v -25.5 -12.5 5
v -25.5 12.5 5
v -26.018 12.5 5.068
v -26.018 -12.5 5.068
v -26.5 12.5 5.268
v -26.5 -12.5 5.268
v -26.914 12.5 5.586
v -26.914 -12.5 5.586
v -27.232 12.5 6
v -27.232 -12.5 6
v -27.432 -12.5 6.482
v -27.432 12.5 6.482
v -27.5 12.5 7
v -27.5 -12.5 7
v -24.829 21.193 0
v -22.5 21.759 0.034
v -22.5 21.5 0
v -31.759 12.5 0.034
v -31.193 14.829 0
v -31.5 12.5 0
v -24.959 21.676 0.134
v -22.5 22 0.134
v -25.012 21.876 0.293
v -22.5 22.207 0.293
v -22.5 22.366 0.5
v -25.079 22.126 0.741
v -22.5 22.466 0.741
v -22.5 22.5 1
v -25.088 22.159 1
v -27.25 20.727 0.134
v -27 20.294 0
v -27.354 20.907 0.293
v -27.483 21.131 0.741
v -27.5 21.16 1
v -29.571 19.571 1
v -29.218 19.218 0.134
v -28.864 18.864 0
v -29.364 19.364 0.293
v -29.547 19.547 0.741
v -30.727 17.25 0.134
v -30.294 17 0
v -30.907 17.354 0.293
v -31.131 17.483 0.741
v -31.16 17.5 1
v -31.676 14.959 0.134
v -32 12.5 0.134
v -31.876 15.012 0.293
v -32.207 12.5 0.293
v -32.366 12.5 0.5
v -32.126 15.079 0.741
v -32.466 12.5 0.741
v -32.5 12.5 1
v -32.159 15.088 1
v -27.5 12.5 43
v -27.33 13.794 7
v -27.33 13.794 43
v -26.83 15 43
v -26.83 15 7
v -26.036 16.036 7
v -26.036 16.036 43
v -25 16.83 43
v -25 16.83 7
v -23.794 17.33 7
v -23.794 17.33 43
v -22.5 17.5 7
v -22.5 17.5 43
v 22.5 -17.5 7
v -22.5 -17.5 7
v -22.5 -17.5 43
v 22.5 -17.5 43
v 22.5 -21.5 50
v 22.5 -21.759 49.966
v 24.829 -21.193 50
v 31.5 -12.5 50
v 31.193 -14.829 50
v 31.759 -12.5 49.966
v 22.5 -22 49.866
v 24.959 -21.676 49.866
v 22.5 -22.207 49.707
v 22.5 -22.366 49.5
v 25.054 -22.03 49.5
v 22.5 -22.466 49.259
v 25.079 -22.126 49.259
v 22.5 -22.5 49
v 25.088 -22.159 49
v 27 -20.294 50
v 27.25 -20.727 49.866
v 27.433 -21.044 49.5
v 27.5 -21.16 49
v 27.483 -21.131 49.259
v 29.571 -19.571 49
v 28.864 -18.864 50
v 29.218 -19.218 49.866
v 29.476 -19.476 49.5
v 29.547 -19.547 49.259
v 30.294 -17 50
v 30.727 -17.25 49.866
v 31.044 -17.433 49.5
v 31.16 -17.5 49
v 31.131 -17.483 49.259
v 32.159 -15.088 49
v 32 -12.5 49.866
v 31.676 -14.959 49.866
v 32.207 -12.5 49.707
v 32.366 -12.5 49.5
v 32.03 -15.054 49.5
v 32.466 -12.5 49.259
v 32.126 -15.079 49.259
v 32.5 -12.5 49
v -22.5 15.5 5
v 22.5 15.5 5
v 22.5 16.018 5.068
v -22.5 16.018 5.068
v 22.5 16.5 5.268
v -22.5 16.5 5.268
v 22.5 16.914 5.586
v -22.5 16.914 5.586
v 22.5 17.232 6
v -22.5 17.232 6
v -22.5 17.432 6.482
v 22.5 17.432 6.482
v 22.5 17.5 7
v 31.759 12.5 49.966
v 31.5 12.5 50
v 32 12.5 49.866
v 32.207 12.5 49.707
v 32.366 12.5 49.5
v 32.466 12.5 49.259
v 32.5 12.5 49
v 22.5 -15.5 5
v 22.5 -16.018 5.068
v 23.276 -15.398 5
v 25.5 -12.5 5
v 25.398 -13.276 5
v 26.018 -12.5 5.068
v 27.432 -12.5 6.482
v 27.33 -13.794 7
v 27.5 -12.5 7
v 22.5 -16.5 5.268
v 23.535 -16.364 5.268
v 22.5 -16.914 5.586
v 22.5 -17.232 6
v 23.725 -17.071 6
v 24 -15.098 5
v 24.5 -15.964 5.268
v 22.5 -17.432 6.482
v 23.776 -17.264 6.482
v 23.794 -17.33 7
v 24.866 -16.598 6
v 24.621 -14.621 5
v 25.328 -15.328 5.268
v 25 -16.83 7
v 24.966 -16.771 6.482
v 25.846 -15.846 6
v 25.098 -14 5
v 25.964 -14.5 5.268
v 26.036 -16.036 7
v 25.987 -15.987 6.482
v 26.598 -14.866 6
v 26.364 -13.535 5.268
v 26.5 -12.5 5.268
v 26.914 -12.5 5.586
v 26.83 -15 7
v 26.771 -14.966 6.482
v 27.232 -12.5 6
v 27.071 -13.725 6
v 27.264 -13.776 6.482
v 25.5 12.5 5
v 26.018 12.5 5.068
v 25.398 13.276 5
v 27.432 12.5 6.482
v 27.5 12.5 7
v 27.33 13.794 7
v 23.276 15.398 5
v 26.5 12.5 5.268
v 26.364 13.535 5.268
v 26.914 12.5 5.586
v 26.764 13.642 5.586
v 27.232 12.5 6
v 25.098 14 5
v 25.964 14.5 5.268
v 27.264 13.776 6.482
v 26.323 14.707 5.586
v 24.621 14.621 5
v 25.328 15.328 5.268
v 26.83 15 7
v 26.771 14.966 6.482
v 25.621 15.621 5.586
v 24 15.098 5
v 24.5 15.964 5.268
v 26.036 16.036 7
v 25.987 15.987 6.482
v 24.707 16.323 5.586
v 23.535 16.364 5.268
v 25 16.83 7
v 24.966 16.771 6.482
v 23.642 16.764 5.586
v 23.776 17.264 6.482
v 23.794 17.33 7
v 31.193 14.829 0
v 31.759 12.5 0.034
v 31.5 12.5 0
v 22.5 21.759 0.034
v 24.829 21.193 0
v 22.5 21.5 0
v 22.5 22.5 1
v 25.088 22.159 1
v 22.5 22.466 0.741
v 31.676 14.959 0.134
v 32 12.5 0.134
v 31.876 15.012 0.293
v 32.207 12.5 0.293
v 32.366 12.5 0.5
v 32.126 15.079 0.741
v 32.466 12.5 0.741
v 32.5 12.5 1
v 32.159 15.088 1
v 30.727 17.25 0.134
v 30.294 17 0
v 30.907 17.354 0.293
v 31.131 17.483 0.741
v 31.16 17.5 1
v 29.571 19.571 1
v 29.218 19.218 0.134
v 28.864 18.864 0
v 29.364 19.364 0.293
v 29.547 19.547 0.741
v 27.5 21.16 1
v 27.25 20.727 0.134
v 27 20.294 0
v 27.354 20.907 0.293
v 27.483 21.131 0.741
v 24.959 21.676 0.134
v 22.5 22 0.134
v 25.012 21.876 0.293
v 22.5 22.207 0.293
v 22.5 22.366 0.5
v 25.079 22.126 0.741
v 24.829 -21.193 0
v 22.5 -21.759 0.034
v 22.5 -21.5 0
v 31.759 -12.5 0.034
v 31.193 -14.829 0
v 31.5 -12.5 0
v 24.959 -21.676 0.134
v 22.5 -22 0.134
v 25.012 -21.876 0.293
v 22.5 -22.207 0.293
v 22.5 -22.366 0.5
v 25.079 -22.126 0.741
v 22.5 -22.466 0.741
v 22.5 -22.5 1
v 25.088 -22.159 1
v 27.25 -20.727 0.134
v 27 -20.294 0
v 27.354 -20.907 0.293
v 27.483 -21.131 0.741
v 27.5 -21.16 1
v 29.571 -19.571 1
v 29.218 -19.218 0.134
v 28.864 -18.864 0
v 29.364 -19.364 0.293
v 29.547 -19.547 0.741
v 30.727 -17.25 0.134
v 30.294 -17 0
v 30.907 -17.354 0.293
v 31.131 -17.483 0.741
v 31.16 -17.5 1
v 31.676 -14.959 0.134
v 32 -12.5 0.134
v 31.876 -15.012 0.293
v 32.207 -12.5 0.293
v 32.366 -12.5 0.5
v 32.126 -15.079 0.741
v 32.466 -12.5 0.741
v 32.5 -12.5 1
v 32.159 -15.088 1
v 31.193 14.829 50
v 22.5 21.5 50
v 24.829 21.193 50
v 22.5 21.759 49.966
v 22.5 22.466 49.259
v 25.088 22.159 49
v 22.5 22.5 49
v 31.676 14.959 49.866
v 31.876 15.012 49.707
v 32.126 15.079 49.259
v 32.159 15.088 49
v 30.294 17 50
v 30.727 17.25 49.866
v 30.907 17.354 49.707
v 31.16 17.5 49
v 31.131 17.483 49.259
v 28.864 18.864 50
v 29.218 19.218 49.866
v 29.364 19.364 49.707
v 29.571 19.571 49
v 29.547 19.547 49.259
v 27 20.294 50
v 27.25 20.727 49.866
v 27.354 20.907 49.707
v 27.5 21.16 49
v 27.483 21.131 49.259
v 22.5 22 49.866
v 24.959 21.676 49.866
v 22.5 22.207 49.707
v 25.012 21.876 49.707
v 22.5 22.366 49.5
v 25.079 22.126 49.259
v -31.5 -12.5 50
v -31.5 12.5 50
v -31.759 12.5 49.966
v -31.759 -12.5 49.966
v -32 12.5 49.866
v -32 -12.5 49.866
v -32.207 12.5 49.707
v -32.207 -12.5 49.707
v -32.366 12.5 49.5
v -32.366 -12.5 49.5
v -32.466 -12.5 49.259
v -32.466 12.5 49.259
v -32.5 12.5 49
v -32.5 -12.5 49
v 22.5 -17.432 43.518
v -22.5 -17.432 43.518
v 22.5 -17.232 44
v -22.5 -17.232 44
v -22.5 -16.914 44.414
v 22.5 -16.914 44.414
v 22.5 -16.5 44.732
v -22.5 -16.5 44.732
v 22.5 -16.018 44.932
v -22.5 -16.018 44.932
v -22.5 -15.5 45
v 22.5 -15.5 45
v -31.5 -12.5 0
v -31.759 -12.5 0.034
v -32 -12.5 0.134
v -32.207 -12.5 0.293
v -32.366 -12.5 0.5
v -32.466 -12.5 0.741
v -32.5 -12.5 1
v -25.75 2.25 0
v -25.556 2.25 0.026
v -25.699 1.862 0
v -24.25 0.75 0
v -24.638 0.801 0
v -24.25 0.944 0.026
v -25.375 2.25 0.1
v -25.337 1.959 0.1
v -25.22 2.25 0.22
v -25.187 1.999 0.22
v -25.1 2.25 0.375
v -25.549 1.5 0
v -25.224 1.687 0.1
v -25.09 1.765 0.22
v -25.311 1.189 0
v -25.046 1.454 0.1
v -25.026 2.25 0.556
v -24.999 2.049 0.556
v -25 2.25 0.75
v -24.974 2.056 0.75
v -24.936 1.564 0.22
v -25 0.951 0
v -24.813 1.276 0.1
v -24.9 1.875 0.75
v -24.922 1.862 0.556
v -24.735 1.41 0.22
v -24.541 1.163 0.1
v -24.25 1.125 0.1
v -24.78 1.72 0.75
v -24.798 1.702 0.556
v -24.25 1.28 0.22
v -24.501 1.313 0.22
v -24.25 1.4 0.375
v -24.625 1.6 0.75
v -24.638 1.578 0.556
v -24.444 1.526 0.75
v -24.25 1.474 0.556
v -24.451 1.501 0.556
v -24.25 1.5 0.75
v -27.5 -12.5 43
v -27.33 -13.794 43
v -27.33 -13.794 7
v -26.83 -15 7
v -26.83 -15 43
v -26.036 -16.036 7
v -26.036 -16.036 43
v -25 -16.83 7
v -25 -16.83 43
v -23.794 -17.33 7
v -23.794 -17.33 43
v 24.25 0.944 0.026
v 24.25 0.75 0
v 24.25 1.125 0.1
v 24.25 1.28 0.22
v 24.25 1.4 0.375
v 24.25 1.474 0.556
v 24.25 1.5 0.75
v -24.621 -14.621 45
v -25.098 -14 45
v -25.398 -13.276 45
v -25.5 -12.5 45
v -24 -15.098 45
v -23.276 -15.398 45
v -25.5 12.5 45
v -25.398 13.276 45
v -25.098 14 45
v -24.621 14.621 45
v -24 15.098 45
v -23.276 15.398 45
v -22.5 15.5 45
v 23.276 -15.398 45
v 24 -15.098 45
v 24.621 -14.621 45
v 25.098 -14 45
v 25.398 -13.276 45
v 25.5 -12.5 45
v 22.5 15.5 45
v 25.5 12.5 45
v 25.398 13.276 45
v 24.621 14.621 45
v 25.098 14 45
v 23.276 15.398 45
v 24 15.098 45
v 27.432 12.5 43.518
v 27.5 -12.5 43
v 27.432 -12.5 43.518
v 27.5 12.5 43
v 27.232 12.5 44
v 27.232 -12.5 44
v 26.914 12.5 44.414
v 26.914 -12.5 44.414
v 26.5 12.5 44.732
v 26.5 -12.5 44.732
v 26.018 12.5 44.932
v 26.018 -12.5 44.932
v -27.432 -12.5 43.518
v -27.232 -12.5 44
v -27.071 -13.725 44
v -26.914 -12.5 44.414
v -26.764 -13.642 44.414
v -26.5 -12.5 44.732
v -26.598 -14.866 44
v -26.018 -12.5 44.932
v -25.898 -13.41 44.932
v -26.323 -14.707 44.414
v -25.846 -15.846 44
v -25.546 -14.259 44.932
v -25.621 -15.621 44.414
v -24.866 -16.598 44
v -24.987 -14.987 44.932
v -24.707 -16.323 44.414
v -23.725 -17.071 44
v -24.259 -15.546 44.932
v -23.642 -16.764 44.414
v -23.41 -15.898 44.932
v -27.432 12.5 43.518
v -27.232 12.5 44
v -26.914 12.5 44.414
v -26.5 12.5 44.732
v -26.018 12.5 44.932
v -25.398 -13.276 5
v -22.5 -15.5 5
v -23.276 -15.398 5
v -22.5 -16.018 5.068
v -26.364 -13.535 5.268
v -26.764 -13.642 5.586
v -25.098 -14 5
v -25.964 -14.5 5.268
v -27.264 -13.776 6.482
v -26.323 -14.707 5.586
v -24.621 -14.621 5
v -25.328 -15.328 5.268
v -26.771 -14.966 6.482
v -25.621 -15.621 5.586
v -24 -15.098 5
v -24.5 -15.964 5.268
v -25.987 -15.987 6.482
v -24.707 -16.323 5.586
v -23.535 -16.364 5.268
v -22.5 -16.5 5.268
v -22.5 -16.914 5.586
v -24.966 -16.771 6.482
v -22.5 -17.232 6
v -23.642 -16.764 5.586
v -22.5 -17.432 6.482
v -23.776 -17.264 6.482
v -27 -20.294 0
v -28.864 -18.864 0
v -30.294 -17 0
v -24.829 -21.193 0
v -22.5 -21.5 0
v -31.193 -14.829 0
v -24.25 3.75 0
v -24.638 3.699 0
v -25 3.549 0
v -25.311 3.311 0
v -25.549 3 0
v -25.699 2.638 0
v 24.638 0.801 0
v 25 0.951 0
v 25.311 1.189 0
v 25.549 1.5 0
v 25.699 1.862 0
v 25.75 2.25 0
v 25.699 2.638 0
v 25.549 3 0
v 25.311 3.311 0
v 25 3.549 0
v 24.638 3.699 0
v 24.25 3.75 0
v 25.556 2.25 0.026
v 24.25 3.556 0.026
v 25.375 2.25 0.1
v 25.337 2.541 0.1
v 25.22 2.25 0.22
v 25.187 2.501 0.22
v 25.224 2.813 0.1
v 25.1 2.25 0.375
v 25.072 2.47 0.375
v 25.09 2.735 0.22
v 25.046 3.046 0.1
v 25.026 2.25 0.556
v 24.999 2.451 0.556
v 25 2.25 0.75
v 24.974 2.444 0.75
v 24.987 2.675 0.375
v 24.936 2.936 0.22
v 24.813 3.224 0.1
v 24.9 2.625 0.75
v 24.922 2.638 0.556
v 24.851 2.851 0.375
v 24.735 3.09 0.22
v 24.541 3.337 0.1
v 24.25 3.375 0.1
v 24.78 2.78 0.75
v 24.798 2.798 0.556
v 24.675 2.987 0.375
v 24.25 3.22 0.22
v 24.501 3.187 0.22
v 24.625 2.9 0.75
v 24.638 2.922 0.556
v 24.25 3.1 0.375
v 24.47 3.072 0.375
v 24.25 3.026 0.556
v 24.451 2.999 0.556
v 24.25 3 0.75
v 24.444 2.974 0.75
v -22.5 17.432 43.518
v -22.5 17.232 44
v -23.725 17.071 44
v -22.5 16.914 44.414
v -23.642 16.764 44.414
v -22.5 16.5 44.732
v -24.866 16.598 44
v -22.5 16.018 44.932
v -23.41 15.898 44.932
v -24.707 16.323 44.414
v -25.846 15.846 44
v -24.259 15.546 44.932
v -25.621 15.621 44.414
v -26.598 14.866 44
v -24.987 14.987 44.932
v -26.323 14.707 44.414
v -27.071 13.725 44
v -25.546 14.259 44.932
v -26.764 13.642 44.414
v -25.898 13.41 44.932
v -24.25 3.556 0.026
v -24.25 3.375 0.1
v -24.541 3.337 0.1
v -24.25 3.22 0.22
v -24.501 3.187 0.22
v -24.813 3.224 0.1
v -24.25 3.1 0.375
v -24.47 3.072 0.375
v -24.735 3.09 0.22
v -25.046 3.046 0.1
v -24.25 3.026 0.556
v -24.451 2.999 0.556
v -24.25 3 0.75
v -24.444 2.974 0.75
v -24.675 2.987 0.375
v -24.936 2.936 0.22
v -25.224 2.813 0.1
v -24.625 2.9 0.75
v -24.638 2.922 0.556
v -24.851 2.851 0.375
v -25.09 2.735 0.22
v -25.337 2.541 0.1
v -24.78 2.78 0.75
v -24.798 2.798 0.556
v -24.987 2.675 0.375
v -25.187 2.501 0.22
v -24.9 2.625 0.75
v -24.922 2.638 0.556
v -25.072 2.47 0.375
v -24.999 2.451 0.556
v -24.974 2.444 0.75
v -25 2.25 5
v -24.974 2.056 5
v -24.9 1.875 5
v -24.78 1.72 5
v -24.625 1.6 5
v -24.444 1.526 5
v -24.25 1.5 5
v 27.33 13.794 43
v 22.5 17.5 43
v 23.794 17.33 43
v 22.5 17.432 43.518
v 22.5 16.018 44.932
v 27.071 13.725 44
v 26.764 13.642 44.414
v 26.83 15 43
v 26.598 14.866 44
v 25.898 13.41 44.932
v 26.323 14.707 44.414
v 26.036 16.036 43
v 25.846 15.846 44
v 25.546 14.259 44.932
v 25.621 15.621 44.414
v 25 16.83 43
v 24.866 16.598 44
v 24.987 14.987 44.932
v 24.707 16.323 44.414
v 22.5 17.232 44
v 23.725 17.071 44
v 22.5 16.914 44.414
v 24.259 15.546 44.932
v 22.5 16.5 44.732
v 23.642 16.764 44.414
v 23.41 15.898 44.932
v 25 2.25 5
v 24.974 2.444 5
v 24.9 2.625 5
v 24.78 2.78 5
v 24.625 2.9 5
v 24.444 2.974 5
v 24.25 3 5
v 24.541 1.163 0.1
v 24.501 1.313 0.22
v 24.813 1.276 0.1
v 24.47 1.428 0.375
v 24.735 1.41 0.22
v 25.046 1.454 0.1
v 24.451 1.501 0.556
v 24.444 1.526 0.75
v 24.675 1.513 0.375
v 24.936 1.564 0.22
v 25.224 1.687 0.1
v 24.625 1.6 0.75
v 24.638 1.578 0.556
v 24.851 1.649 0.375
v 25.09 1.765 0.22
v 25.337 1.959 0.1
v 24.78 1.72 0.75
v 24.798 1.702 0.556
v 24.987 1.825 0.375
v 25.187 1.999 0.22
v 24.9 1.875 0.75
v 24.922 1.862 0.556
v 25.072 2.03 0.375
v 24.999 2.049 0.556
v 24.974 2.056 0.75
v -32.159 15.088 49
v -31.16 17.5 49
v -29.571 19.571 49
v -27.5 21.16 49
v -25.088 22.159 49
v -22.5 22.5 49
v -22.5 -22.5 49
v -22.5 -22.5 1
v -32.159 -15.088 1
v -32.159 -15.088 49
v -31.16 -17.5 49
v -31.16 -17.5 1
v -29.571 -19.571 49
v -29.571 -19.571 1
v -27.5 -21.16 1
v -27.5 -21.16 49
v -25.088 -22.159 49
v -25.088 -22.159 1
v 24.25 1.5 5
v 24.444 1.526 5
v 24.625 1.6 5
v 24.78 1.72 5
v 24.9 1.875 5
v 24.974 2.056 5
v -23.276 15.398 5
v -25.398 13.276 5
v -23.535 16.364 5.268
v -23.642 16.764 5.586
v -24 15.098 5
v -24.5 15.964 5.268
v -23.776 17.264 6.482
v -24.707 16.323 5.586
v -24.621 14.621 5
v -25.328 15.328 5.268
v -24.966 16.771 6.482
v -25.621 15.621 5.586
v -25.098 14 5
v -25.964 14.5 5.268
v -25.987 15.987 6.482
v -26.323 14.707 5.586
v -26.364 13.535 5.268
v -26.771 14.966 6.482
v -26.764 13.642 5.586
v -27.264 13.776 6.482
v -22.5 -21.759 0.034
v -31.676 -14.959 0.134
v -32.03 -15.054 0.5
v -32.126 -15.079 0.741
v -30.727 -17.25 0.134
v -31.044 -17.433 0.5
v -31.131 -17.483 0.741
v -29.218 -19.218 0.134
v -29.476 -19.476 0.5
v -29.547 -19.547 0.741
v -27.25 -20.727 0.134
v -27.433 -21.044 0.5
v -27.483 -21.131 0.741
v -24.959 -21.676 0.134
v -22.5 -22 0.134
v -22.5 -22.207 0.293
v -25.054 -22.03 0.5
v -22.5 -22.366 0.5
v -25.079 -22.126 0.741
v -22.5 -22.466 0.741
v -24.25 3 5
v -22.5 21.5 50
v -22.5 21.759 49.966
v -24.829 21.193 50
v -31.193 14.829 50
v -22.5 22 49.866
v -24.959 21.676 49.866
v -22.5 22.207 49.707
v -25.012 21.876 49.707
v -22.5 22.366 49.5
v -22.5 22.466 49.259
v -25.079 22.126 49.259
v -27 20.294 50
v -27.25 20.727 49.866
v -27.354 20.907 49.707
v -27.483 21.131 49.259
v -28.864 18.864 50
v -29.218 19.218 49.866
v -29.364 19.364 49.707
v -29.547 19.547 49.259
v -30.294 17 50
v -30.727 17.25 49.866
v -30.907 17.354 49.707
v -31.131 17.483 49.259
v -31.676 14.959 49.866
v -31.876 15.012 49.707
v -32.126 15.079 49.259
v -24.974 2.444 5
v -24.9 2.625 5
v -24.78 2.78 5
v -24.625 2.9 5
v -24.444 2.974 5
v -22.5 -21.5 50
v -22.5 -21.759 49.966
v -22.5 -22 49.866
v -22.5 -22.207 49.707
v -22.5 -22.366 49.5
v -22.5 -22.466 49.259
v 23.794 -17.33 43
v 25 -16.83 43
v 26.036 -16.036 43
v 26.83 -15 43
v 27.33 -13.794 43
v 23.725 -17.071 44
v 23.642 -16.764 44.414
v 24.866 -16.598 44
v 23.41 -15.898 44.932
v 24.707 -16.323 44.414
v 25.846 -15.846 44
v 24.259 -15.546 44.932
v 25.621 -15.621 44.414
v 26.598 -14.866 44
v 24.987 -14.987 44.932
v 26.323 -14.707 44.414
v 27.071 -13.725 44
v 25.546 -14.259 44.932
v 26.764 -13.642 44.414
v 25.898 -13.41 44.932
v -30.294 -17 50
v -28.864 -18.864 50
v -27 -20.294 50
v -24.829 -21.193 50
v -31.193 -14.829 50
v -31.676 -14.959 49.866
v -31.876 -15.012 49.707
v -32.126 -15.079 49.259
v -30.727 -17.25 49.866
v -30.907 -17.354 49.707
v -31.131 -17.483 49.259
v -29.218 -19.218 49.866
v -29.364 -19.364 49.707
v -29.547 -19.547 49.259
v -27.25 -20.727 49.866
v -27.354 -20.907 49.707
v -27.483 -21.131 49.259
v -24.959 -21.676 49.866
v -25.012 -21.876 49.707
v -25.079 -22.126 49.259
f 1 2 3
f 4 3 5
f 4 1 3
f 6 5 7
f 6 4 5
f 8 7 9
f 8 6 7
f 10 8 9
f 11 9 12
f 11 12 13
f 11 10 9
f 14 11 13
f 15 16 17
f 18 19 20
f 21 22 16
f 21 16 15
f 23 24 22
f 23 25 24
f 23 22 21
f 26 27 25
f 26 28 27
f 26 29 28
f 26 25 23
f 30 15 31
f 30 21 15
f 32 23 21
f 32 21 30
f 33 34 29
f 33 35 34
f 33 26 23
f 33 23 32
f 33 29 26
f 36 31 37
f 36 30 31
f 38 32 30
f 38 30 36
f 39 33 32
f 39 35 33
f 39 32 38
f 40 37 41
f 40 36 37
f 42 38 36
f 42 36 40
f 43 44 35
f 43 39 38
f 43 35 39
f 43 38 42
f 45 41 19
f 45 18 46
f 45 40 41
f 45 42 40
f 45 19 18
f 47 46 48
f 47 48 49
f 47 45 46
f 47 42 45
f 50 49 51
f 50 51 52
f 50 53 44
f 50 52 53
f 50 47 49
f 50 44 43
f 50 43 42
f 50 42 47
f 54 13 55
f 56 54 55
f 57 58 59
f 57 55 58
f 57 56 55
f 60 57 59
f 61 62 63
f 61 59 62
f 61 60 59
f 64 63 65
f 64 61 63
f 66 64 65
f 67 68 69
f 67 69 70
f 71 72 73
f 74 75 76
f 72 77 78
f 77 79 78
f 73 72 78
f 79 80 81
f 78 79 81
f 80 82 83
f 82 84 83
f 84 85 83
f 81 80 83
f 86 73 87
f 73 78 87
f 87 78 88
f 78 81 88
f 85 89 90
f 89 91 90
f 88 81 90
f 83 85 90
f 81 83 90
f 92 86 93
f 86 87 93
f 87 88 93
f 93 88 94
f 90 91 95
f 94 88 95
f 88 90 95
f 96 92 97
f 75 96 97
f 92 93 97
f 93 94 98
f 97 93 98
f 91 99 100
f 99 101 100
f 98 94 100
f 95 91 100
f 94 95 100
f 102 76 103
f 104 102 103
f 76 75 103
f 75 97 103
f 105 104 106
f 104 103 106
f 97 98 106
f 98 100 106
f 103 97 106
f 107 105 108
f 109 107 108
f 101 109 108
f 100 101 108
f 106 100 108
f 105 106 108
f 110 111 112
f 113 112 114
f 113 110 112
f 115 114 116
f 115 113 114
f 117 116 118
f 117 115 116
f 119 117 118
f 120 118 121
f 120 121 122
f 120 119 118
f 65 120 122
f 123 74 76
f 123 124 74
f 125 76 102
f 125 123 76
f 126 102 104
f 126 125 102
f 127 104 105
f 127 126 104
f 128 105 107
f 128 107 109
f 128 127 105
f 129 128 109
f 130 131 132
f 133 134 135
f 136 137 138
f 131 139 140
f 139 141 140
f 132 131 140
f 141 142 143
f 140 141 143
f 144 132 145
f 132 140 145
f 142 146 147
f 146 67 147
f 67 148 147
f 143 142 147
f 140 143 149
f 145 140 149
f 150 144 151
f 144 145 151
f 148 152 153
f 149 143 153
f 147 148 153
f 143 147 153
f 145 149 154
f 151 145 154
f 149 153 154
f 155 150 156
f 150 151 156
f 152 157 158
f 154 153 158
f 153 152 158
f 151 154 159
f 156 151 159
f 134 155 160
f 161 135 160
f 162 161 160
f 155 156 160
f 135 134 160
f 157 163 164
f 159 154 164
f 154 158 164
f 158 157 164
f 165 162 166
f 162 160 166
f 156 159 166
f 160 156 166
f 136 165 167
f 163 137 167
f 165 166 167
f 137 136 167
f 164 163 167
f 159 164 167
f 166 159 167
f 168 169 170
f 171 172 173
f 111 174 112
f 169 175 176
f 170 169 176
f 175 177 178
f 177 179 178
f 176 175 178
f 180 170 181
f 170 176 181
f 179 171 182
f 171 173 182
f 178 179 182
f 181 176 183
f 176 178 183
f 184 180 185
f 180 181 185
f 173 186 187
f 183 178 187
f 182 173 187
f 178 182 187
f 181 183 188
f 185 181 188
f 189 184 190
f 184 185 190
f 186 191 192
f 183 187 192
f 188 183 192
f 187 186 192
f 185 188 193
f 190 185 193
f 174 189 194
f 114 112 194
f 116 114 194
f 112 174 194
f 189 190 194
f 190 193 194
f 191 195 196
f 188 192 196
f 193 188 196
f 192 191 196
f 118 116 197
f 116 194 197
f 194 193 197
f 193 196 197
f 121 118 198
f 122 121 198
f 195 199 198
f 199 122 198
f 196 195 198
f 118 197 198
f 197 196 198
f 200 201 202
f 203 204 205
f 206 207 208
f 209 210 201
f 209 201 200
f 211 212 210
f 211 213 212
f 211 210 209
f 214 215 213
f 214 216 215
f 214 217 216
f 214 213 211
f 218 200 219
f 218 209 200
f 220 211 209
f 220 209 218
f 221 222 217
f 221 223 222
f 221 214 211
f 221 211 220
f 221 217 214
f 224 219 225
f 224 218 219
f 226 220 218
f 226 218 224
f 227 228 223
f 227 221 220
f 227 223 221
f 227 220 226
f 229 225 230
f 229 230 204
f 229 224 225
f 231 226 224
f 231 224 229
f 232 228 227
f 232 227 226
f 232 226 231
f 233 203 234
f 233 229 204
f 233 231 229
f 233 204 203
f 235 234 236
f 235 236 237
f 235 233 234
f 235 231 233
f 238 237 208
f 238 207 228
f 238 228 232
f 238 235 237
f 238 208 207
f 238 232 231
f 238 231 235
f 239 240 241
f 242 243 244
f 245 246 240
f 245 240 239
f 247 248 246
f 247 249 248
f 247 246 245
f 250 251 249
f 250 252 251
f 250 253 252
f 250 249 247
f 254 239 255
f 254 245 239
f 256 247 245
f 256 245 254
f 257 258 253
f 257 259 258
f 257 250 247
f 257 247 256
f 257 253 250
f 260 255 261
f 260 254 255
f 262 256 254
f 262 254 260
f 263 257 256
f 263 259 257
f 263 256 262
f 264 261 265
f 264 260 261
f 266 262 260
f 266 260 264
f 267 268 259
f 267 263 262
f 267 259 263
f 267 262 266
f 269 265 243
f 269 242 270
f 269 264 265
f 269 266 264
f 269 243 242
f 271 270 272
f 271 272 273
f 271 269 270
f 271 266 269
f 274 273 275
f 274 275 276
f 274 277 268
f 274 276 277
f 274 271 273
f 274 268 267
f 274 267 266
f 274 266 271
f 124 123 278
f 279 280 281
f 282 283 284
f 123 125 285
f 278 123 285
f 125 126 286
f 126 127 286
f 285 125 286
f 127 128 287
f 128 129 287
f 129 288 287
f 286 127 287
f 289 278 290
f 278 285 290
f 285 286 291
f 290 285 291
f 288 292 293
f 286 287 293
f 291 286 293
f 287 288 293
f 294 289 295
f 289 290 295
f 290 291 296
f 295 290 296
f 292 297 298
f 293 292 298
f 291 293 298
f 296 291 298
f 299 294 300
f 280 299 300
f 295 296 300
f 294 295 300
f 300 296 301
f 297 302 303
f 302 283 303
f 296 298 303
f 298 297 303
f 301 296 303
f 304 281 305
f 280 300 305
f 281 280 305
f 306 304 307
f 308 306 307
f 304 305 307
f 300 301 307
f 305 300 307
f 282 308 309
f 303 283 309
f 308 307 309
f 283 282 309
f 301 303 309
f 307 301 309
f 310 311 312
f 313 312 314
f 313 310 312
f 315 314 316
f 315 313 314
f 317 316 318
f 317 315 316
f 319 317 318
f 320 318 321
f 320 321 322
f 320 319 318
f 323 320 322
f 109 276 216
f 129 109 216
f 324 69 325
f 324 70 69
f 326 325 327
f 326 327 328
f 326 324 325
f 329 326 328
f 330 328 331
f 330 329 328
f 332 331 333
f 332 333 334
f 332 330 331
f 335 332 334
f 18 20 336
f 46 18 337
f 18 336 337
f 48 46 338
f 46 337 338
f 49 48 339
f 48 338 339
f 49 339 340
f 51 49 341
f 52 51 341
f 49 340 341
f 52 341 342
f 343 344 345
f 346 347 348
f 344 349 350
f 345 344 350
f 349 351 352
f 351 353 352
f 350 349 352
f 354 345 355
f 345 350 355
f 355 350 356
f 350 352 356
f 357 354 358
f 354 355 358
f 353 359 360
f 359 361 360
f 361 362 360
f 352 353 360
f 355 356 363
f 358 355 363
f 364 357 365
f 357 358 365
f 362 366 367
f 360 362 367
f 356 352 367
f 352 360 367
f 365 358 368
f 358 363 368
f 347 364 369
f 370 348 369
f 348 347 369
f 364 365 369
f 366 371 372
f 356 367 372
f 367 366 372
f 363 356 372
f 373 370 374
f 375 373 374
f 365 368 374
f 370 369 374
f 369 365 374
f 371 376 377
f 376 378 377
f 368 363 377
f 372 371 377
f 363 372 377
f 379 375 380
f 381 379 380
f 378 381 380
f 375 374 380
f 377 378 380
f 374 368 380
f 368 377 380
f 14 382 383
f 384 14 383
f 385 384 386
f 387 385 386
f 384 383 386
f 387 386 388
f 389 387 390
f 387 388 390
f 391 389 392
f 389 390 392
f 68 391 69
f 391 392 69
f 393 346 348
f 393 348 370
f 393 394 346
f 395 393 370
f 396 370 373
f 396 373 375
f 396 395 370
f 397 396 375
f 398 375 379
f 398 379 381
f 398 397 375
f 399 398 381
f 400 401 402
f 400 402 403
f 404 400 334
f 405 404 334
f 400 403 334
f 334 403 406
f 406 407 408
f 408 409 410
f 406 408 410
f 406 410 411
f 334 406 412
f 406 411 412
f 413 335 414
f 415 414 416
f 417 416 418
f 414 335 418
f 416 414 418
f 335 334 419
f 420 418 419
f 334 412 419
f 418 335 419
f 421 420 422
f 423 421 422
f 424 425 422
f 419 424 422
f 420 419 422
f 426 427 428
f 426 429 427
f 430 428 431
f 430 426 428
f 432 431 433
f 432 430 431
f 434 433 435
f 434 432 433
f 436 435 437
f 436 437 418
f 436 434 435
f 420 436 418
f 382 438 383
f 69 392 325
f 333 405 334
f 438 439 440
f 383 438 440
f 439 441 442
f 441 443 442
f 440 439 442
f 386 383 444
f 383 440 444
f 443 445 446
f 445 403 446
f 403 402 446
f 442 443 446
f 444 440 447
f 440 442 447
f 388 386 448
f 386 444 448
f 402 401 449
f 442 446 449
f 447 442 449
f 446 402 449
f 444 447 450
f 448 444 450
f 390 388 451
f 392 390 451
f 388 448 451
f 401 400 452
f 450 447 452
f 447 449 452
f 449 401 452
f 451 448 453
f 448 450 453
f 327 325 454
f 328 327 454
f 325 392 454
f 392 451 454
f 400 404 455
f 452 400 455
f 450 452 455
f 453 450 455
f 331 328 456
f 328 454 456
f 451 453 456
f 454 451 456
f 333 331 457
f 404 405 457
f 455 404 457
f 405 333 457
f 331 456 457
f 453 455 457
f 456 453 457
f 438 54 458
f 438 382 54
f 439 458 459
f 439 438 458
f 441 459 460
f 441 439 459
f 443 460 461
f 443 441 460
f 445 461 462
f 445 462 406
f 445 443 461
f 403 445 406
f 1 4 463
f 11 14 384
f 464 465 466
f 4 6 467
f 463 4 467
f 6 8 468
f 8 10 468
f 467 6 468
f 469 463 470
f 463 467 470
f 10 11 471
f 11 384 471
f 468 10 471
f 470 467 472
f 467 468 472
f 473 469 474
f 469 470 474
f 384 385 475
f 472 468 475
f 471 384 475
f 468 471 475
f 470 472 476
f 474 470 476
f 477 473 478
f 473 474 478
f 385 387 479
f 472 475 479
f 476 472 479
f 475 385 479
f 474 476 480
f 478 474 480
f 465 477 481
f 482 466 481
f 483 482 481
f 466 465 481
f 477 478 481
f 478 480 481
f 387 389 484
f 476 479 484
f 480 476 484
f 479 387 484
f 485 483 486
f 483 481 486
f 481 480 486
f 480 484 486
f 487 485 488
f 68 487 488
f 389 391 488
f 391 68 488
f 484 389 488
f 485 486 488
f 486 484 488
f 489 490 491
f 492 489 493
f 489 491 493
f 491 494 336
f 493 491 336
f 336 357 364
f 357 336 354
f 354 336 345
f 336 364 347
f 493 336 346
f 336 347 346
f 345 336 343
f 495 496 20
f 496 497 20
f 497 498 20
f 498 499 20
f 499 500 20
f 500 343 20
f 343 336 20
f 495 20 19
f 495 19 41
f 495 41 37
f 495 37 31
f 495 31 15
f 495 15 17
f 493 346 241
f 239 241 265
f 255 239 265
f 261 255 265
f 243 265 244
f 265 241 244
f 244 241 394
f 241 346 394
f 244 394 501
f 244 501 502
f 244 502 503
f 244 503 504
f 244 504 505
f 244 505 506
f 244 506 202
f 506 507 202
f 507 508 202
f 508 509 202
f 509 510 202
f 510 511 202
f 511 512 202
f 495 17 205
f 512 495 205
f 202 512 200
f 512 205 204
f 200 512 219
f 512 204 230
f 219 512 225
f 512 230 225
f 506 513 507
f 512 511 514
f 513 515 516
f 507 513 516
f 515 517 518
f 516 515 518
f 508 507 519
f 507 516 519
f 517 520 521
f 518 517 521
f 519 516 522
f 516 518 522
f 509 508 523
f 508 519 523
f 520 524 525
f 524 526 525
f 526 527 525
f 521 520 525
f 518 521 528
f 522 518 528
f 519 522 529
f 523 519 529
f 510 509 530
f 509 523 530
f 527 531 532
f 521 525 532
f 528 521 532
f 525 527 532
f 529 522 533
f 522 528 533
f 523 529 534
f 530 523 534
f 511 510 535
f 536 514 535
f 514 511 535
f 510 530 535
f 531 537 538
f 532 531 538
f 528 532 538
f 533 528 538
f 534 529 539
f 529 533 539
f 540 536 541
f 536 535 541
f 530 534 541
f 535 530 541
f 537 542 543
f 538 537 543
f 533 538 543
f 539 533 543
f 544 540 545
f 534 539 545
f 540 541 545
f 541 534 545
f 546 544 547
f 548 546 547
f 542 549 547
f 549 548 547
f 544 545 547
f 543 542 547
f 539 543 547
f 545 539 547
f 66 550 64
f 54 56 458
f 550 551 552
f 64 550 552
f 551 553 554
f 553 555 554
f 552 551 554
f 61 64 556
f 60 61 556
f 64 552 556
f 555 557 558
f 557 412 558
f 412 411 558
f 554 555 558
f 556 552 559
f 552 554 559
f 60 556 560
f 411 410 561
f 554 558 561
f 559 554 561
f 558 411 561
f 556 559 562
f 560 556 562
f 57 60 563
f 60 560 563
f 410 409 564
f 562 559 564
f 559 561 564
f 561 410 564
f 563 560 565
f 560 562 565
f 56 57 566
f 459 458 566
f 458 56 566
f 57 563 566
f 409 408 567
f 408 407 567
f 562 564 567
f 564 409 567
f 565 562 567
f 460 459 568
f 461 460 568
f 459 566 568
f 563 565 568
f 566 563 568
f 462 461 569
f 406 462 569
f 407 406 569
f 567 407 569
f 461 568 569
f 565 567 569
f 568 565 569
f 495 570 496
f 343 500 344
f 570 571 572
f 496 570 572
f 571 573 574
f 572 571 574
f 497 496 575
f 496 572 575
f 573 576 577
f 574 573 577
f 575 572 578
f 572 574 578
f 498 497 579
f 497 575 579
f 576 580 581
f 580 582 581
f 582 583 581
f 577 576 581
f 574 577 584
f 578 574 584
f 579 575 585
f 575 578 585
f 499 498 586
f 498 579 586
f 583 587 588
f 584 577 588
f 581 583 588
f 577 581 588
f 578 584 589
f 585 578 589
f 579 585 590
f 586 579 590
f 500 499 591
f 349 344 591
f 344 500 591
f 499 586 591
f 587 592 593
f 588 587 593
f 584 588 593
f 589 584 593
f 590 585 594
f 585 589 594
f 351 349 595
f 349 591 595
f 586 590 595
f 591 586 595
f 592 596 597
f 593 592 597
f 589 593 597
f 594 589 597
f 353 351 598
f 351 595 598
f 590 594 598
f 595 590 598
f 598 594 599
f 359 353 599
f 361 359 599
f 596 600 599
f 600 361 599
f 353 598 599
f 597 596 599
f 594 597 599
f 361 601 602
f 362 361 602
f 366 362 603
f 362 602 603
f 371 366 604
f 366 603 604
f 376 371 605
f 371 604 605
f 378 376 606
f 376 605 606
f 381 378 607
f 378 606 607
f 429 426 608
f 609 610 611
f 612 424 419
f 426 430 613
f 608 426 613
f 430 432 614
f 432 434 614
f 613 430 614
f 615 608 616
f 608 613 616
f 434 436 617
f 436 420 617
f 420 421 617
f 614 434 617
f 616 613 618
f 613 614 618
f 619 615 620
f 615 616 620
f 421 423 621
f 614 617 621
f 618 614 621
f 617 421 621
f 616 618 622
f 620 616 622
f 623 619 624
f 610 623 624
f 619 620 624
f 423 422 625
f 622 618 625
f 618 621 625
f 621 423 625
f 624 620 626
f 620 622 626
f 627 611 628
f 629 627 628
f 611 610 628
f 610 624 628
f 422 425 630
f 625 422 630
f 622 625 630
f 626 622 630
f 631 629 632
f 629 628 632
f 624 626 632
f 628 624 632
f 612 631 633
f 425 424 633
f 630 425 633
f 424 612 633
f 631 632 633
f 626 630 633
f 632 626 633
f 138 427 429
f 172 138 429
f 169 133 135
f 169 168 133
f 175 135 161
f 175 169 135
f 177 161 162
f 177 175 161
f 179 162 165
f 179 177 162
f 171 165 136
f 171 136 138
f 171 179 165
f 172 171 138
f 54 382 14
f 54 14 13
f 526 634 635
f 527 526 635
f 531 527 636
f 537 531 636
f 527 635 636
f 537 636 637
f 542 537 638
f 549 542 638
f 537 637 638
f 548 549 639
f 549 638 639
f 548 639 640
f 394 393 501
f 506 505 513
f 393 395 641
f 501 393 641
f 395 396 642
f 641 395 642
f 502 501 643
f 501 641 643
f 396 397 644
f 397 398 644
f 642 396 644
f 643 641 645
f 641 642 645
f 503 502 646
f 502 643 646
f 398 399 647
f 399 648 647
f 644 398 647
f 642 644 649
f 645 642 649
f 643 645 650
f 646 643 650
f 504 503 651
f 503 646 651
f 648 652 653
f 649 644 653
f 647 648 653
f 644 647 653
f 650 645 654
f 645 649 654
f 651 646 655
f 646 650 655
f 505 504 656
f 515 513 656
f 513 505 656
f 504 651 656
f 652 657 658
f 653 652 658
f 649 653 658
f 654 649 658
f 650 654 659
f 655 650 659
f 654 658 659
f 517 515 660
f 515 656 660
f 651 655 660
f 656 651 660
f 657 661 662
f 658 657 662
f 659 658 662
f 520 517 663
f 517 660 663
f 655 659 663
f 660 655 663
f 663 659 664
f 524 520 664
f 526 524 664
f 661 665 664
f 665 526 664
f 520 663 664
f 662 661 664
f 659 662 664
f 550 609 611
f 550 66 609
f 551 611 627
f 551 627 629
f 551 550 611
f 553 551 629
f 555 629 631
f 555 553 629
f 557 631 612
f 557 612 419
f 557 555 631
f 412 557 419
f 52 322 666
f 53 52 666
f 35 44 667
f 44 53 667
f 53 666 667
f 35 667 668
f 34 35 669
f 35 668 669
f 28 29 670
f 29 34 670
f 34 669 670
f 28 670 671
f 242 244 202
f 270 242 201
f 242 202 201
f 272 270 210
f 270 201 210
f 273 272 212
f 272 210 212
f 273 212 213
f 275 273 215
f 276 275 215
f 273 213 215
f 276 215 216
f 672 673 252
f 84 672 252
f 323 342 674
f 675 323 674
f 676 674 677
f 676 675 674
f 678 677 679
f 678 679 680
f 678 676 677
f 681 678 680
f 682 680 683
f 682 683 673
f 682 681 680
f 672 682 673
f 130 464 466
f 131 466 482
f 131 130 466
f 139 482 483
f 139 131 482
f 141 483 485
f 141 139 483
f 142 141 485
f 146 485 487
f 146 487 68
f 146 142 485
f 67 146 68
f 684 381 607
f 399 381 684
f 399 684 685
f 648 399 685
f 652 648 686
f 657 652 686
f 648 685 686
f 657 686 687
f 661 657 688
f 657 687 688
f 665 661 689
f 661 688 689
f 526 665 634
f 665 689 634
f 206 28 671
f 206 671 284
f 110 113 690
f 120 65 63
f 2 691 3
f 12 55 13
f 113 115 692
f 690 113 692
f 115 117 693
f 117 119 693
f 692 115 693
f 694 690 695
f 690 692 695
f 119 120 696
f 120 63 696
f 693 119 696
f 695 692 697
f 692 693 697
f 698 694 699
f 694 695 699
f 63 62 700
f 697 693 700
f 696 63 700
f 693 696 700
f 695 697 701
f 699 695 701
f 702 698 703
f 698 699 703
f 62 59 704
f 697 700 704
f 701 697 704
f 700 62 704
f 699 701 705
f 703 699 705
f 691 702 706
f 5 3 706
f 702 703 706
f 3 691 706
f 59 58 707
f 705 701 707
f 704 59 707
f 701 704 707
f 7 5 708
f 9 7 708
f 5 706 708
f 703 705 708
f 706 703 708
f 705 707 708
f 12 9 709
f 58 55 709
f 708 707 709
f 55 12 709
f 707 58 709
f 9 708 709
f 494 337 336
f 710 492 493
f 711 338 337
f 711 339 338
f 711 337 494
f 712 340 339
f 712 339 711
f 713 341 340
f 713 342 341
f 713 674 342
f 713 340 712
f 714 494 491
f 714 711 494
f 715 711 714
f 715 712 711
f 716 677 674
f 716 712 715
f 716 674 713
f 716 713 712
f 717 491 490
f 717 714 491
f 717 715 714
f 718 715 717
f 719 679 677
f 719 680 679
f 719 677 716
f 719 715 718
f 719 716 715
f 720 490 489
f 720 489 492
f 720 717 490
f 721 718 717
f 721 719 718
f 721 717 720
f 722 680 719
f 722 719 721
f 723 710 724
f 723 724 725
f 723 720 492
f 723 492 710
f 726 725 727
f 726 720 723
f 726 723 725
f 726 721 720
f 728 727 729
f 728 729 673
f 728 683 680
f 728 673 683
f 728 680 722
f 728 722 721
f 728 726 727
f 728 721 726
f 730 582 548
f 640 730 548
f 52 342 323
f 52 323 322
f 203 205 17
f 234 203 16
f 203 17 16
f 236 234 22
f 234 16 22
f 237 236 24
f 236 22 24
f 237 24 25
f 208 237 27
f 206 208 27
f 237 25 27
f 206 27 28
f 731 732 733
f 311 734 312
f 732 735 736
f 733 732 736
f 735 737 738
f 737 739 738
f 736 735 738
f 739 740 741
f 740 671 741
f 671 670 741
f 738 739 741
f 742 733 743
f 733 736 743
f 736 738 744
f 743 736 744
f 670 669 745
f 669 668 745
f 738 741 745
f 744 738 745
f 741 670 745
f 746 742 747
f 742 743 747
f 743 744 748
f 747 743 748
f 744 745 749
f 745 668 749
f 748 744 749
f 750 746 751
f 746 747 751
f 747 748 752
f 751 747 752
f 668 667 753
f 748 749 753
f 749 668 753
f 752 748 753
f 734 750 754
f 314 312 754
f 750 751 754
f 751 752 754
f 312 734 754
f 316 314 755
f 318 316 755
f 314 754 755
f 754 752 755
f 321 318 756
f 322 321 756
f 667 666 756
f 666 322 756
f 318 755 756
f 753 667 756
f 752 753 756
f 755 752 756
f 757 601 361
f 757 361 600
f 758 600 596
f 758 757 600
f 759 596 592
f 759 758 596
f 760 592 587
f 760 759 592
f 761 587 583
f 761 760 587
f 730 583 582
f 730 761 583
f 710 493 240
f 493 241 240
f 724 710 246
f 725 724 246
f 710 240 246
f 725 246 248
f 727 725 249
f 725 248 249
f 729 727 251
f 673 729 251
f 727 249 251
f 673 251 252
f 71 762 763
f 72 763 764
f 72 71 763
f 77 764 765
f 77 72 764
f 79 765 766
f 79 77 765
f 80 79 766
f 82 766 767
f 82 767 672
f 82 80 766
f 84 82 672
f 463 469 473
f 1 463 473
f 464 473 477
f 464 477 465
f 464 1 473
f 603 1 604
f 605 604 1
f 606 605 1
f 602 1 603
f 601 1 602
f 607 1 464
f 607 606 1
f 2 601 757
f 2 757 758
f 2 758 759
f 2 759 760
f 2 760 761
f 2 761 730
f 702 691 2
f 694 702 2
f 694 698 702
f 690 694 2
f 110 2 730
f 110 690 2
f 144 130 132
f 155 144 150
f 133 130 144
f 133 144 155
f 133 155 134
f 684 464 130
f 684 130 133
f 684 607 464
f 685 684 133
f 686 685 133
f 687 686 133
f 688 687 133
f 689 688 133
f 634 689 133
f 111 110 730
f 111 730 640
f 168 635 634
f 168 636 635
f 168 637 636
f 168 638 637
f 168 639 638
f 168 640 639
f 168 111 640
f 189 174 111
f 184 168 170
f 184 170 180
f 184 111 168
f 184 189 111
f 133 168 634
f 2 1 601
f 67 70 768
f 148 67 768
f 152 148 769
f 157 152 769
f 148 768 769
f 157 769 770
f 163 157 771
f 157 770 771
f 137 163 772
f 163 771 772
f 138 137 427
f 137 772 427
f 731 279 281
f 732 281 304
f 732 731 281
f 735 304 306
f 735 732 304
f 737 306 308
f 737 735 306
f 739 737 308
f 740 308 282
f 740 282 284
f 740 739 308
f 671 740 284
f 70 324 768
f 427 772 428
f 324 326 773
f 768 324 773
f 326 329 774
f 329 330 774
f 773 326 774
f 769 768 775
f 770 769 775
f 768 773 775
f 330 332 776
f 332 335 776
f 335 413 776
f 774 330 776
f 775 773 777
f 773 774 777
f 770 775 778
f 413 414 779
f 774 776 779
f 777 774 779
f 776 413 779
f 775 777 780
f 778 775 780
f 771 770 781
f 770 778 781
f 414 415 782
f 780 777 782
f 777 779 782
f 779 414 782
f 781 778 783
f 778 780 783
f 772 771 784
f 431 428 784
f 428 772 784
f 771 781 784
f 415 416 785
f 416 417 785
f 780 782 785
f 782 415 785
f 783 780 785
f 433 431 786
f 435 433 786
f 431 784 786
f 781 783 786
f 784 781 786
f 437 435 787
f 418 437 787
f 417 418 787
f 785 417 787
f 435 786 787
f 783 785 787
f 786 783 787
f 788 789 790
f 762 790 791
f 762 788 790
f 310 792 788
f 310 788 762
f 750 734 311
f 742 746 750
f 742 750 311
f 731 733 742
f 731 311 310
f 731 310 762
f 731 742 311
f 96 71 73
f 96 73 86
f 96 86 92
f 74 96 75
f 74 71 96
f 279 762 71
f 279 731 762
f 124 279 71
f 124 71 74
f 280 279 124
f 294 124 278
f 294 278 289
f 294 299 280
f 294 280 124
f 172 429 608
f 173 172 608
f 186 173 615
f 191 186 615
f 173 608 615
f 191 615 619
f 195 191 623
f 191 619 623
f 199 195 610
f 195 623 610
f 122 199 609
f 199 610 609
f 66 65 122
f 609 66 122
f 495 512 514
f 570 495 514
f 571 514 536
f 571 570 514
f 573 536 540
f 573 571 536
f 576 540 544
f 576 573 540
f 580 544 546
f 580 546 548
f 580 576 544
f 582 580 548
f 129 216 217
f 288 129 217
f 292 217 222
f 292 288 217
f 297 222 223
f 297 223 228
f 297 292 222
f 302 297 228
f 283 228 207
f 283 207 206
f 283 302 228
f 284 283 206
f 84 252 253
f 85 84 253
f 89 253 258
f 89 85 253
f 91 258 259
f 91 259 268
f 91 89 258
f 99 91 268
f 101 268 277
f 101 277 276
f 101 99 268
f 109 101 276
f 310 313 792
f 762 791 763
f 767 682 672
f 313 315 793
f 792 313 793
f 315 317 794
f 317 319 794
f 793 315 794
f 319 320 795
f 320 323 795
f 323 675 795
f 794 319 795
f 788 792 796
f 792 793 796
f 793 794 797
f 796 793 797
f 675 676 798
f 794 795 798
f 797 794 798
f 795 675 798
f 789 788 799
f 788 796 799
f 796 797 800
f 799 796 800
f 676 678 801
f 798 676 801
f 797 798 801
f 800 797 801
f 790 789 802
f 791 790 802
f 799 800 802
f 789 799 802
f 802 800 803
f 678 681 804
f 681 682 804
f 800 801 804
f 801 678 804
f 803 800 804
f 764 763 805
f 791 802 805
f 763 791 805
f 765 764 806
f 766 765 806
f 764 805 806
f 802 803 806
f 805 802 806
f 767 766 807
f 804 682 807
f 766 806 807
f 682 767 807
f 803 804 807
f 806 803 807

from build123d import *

# Parameters (mm, degrees)
F0_W     = 65
F0_H     = 45
F1_DEPTH = 50
F2_R     = 10
F3_T     = -5
F4_W     = 50
F4_H     = 1.5
F5_DEPTH = 5
F6_R     = 1
F7_F1_R  = 0.7499
F7_F2_R  = 0.75
F8_R     = 2


# Not quite as in the source:
# - a fillet or chamfer is up to 0.001 mm smaller than in the source, because OpenCascade refuses the exact size


with BuildPart() as f1:
    # F0 (on Top) → F1 (new body)
    with BuildSketch(Plane.XY):
        Rectangle(F0_W, F0_H)
    extrude(amount=F1_DEPTH)

    # F2
    f2_edges = [f1.edges().sort_by_distance(p)[0] for p in [
        (32.5, -22.5, 25),
        (-32.5, -22.5, 25),
        (-32.5, 22.5, 25),
        (32.5, 22.5, 25),
    ]]
    fillet(f2_edges, radius=F2_R)

    # F3 (hollow: no face is removed)
    offset(amount=F3_T, mode=Mode.SUBTRACT)

    # F4 (on face) → F5 (cut, through all)
    with BuildSketch(Plane(origin=(0, 0, 0), x_dir=(1, 0, 0), z_dir=(0, 0, -1))):
        with Locations((0, -2.25)):
            Rectangle(F4_W, F4_H)
    extrude(amount=-F5_DEPTH, mode=Mode.SUBTRACT)

    # F6
    f6_edges = [f1.edges().sort_by_distance(p)[0] for p in [
        (0, -22.5, 0),
        (32.5, 0, 50),
        (29.571068, -19.571068, 50),
        (29.571068, 19.571068, 50),
        (0, -22.5, 50),
        (0, 22.5, 50),
        (-29.571068, -19.571068, 50),
        (-29.571068, 19.571068, 50),
        (-32.5, 0, 50),
        (32.5, 0, 0),
        (29.571068, -19.571068, 0),
        (29.571068, 19.571068, 0),
        (0, 22.5, 0),
        (-29.571068, -19.571068, 0),
        (-29.571068, 19.571068, 0),
        (-32.5, 0, 0),
    ]]
    fillet(f6_edges, radius=F6_R)

    # F7: fillet of radius 0.75 on 6 edges, made by hand

    # F7_f1 (radius 0.75 in the source; OpenCascade refuses exactly that, so slightly less here)
    f7_f1_edges = [f1.edges().sort_by_distance(p)[0] for p in [
        (-25, 1.5, 2.5),
        (-25, 3, 2.5),
        (25, 3, 2.5),
        (25, 1.5, 2.5),
    ]]
    fillet(f7_f1_edges, radius=F7_F1_R)

    # F7_f2
    f7_f2_edges = [f1.edges().sort_by_distance(p)[0] for p in [
        (0, 1.5, 0),
        (0, 3, 0),
        (-24.7803593752, 2.7803593752, 0),
        (24.7803593752, 2.7803593752, 0),
        (24.7803593752, 1.7196406248, 0),
        (-24.7803593752, 1.7196406248, 0),
    ]]
    fillet(f7_f2_edges, radius=F7_F2_R)

    # F8
    f8_edges = [f1.edges().sort_by_distance(p)[0] for p in [
        (27.5, 0, 5),
        (0, 17.5, 45),
        (26.035534, 16.035534, 5),
        (26.035534, -16.035534, 5),
        (0, 17.5, 5),
        (0, -17.5, 5),
        (-26.035534, 16.035534, 5),
        (-26.035534, -16.035534, 5),
        (-27.5, 0, 5),
        (27.5, 0, 45),
        (26.035534, 16.035534, 45),
        (26.035534, -16.035534, 45),
        (0, -17.5, 45),
        (-26.035534, 16.035534, 45),
        (-26.035534, -16.035534, 45),
        (-27.5, 0, 45),
    ]]
    fillet(f8_edges, radius=F8_R)


solid = f1.part
